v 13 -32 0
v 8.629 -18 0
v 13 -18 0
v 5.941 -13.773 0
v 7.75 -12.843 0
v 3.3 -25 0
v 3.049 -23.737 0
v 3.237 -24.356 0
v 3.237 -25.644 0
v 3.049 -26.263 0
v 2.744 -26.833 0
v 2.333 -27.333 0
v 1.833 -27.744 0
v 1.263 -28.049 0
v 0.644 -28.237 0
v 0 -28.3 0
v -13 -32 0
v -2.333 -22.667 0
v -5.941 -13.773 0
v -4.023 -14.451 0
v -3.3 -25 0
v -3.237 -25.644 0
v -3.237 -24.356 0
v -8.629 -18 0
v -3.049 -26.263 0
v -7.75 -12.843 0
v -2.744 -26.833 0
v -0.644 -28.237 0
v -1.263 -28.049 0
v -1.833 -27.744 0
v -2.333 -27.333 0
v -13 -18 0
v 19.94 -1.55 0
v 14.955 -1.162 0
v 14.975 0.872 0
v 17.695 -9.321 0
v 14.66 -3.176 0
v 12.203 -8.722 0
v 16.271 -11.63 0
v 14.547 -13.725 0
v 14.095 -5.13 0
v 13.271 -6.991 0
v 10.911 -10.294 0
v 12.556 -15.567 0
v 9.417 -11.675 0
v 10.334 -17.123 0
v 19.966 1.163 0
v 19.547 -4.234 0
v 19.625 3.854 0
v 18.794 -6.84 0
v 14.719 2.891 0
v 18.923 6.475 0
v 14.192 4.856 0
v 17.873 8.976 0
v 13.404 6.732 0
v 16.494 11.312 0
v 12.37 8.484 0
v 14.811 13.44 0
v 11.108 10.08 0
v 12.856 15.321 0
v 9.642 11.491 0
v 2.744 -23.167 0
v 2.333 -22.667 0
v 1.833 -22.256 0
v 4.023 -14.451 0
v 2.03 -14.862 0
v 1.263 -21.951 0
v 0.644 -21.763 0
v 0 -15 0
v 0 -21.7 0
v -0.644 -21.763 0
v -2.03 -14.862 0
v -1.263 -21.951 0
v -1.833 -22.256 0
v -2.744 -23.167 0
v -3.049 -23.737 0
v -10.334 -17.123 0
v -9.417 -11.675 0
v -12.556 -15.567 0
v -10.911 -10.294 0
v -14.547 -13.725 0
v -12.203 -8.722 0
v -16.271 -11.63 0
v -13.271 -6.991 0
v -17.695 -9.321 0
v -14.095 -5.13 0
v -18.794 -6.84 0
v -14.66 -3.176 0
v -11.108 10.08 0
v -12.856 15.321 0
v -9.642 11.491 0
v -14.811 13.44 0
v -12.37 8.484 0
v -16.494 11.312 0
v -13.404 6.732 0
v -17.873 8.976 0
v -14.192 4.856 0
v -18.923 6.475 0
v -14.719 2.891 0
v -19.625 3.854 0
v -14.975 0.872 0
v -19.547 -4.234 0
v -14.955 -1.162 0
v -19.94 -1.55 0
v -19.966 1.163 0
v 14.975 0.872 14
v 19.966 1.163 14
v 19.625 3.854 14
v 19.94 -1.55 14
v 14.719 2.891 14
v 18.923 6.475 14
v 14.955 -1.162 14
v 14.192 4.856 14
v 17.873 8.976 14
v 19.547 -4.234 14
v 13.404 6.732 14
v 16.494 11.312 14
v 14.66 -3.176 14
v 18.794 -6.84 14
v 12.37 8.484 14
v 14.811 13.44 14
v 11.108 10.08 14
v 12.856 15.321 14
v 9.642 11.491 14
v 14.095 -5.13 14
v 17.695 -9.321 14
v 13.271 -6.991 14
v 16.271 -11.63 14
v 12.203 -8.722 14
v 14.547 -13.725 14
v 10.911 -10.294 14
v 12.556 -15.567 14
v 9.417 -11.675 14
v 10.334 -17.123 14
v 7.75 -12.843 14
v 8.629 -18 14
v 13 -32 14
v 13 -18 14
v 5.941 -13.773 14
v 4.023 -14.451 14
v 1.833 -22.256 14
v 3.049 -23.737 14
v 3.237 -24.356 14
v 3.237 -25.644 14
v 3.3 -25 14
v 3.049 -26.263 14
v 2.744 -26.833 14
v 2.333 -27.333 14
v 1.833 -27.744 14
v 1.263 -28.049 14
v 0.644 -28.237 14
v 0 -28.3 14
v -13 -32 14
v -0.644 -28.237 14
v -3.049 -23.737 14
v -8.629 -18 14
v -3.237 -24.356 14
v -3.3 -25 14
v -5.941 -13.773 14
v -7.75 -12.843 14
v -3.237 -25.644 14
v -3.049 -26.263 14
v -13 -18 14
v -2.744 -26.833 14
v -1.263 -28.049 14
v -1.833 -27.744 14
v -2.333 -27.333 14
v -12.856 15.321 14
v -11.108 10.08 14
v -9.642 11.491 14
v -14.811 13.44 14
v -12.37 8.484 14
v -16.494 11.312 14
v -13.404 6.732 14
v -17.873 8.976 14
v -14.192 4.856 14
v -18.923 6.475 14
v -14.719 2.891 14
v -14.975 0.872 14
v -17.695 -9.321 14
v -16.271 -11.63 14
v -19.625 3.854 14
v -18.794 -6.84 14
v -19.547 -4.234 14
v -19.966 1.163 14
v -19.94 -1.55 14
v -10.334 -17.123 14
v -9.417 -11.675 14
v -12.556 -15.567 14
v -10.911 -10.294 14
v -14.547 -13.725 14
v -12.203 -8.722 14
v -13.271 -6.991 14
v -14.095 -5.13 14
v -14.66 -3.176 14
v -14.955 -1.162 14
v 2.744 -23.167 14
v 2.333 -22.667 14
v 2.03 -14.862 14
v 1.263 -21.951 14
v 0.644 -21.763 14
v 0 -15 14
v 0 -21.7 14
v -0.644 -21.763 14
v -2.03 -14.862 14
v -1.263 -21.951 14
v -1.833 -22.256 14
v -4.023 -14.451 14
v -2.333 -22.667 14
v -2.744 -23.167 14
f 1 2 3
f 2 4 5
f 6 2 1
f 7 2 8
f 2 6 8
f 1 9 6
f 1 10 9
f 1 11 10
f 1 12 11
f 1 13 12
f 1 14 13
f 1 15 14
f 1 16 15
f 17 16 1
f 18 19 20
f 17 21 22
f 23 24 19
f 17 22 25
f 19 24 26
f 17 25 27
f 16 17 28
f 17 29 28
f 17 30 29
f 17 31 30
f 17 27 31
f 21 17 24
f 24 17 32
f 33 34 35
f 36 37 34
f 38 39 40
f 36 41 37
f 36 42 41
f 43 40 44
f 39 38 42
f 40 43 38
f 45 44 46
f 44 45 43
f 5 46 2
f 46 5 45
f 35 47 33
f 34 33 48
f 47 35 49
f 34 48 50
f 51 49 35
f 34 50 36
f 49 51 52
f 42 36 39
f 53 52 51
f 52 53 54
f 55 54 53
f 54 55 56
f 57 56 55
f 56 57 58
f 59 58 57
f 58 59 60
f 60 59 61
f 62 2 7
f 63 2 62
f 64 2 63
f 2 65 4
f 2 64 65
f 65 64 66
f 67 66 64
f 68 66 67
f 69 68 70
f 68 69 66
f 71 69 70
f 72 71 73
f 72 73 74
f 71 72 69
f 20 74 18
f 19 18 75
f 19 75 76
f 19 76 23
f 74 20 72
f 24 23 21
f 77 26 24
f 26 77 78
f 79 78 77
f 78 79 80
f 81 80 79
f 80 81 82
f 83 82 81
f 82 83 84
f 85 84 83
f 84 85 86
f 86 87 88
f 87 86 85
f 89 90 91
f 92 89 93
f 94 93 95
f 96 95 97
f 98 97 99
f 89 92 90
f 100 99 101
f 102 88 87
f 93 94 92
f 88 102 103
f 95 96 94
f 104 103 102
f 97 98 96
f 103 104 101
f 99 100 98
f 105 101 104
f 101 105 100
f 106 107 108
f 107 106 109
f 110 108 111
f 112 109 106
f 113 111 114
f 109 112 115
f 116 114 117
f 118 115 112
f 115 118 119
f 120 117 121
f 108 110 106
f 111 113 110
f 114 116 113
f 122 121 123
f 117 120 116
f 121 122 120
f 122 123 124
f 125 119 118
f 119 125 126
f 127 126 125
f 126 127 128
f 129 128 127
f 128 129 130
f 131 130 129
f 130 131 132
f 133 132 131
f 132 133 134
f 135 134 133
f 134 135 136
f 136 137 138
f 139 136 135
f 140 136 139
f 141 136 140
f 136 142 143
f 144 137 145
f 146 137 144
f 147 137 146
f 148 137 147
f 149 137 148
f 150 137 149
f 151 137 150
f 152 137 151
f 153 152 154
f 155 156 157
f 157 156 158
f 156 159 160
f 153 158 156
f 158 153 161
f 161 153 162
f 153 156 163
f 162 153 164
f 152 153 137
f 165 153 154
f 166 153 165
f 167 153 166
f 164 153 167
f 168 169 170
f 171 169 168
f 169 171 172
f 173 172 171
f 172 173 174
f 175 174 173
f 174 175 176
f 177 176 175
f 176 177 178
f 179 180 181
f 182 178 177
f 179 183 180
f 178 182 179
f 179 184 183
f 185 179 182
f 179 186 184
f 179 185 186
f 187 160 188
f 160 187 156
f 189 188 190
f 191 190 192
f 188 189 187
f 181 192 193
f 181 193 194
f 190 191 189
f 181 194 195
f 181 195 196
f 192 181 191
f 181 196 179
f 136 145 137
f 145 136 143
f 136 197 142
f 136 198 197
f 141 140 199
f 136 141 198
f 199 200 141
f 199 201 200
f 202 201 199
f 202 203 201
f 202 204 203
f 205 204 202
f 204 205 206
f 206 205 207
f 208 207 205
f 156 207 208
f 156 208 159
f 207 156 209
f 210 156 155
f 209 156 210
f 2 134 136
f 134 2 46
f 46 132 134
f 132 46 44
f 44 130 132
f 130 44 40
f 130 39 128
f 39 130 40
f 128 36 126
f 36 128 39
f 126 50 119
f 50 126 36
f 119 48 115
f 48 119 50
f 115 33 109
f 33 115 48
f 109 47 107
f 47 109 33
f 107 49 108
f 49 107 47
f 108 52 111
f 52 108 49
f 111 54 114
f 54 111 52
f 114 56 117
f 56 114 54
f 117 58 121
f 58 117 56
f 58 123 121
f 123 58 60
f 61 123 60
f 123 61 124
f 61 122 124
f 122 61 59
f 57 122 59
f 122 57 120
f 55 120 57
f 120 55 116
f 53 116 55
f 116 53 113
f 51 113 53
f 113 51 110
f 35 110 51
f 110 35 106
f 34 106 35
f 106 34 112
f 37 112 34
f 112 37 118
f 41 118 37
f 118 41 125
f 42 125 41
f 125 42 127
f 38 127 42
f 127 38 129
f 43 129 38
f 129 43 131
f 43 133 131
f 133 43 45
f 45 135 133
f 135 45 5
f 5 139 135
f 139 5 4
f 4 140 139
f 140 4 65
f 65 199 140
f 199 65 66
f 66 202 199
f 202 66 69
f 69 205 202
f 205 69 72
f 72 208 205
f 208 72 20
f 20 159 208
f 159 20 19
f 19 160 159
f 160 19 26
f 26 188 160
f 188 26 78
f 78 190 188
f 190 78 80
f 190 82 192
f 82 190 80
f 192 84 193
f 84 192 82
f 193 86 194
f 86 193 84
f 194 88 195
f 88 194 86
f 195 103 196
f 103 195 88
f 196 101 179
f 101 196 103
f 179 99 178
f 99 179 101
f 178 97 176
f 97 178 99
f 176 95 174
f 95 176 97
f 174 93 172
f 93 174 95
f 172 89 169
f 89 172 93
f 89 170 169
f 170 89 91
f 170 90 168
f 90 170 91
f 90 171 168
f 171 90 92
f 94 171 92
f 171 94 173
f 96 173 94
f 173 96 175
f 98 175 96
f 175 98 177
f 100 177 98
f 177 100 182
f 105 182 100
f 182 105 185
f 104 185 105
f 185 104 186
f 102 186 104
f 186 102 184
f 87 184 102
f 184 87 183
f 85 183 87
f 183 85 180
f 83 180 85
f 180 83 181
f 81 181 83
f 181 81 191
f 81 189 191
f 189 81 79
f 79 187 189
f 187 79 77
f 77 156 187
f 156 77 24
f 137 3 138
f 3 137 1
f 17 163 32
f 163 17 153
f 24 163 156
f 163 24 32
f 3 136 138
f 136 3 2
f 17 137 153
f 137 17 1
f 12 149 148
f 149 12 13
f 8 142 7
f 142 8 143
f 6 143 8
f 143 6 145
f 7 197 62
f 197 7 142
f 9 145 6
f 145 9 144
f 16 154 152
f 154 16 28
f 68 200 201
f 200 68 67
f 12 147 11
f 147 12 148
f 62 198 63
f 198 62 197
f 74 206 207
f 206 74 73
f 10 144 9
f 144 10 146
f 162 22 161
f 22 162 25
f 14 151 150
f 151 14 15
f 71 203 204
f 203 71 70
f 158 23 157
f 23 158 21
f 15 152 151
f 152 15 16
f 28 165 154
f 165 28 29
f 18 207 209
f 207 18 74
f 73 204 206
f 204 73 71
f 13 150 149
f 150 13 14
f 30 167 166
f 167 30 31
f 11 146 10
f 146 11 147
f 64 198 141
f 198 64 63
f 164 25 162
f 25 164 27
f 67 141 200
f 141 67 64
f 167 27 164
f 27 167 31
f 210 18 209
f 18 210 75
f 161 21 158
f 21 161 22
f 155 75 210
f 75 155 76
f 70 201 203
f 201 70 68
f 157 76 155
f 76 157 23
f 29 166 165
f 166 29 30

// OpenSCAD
$fn = 32;

// ----------------------------------------------------------------------
// Spring clip: 40 mm outside, 5 mm band, 80 degree opening
// ----------------------------------------------------------------------

// --- parameters (mm) ---
outer_r = 20;             // clip outside radius
inner_r = 15;             // clip bore radius
band = 5;                 // band thickness
clip_w = 14;              // clip width
opening = 80;             // opening angle
tab_w = 26;               // tab width
tab_len = 12;             // tab length past the clip
tab_hole = 6.6;           // tab fixing hole

clip_profile = [[-12.856, 15.321], [-14.811, 13.44], [-16.494, 11.312], [-17.873, 8.976], [-18.923, 6.475], [-19.625, 3.854], [-19.966, 1.163], [-19.94, -1.55], [-19.547, -4.234], [-18.794, -6.84], [-17.695, -9.321], [-16.271, -11.63], [-14.547, -13.725], [-12.556, -15.567], [-10.334, -17.123], [-7.922, -18.364], [-5.363, -19.267], [-2.707, -19.816], [0, -20], [2.707, -19.816], [5.363, -19.267], [7.922, -18.364], [10.334, -17.123], [12.556, -15.567], [14.547, -13.725], [16.271, -11.63], [17.695, -9.321], [18.794, -6.84], [19.547, -4.234], [19.94, -1.55], [19.966, 1.163], [19.625, 3.854], [18.923, 6.475], [17.873, 8.976], [16.494, 11.312], [14.811, 13.44], [12.856, 15.321], [9.642, 11.491], [11.108, 10.08], [12.37, 8.484], [13.404, 6.732], [14.192, 4.856], [14.719, 2.891], [14.975, 0.872], [14.955, -1.162], [14.66, -3.176], [14.095, -5.13], [13.271, -6.991], [12.203, -8.722], [10.911, -10.294], [9.417, -11.675], [7.75, -12.843], [5.941, -13.773], [4.023, -14.451], [2.03, -14.862], [0, -15], [-2.03, -14.862], [-4.023, -14.451], [-5.941, -13.773], [-7.75, -12.843], [-9.417, -11.675], [-10.911, -10.294], [-12.203, -8.722], [-13.271, -6.991], [-14.095, -5.13], [-14.66, -3.176], [-14.955, -1.162], [-14.975, 0.872], [-14.719, 2.891], [-14.192, 4.856], [-13.404, 6.732], [-12.37, 8.484], [-11.108, 10.08], [-9.642, 11.491]];

difference() {
  union() {
    linear_extrude(height = clip_w) polygon(clip_profile);
    /* mounting tab, sunk 2 mm into the band */
    translate([-13, -32, 0]) cube([tab_w, 14, clip_w]);
  }
  translate([0, -25, -2.5]) cylinder(h = clip_w + 5, d = tab_hole);
}
